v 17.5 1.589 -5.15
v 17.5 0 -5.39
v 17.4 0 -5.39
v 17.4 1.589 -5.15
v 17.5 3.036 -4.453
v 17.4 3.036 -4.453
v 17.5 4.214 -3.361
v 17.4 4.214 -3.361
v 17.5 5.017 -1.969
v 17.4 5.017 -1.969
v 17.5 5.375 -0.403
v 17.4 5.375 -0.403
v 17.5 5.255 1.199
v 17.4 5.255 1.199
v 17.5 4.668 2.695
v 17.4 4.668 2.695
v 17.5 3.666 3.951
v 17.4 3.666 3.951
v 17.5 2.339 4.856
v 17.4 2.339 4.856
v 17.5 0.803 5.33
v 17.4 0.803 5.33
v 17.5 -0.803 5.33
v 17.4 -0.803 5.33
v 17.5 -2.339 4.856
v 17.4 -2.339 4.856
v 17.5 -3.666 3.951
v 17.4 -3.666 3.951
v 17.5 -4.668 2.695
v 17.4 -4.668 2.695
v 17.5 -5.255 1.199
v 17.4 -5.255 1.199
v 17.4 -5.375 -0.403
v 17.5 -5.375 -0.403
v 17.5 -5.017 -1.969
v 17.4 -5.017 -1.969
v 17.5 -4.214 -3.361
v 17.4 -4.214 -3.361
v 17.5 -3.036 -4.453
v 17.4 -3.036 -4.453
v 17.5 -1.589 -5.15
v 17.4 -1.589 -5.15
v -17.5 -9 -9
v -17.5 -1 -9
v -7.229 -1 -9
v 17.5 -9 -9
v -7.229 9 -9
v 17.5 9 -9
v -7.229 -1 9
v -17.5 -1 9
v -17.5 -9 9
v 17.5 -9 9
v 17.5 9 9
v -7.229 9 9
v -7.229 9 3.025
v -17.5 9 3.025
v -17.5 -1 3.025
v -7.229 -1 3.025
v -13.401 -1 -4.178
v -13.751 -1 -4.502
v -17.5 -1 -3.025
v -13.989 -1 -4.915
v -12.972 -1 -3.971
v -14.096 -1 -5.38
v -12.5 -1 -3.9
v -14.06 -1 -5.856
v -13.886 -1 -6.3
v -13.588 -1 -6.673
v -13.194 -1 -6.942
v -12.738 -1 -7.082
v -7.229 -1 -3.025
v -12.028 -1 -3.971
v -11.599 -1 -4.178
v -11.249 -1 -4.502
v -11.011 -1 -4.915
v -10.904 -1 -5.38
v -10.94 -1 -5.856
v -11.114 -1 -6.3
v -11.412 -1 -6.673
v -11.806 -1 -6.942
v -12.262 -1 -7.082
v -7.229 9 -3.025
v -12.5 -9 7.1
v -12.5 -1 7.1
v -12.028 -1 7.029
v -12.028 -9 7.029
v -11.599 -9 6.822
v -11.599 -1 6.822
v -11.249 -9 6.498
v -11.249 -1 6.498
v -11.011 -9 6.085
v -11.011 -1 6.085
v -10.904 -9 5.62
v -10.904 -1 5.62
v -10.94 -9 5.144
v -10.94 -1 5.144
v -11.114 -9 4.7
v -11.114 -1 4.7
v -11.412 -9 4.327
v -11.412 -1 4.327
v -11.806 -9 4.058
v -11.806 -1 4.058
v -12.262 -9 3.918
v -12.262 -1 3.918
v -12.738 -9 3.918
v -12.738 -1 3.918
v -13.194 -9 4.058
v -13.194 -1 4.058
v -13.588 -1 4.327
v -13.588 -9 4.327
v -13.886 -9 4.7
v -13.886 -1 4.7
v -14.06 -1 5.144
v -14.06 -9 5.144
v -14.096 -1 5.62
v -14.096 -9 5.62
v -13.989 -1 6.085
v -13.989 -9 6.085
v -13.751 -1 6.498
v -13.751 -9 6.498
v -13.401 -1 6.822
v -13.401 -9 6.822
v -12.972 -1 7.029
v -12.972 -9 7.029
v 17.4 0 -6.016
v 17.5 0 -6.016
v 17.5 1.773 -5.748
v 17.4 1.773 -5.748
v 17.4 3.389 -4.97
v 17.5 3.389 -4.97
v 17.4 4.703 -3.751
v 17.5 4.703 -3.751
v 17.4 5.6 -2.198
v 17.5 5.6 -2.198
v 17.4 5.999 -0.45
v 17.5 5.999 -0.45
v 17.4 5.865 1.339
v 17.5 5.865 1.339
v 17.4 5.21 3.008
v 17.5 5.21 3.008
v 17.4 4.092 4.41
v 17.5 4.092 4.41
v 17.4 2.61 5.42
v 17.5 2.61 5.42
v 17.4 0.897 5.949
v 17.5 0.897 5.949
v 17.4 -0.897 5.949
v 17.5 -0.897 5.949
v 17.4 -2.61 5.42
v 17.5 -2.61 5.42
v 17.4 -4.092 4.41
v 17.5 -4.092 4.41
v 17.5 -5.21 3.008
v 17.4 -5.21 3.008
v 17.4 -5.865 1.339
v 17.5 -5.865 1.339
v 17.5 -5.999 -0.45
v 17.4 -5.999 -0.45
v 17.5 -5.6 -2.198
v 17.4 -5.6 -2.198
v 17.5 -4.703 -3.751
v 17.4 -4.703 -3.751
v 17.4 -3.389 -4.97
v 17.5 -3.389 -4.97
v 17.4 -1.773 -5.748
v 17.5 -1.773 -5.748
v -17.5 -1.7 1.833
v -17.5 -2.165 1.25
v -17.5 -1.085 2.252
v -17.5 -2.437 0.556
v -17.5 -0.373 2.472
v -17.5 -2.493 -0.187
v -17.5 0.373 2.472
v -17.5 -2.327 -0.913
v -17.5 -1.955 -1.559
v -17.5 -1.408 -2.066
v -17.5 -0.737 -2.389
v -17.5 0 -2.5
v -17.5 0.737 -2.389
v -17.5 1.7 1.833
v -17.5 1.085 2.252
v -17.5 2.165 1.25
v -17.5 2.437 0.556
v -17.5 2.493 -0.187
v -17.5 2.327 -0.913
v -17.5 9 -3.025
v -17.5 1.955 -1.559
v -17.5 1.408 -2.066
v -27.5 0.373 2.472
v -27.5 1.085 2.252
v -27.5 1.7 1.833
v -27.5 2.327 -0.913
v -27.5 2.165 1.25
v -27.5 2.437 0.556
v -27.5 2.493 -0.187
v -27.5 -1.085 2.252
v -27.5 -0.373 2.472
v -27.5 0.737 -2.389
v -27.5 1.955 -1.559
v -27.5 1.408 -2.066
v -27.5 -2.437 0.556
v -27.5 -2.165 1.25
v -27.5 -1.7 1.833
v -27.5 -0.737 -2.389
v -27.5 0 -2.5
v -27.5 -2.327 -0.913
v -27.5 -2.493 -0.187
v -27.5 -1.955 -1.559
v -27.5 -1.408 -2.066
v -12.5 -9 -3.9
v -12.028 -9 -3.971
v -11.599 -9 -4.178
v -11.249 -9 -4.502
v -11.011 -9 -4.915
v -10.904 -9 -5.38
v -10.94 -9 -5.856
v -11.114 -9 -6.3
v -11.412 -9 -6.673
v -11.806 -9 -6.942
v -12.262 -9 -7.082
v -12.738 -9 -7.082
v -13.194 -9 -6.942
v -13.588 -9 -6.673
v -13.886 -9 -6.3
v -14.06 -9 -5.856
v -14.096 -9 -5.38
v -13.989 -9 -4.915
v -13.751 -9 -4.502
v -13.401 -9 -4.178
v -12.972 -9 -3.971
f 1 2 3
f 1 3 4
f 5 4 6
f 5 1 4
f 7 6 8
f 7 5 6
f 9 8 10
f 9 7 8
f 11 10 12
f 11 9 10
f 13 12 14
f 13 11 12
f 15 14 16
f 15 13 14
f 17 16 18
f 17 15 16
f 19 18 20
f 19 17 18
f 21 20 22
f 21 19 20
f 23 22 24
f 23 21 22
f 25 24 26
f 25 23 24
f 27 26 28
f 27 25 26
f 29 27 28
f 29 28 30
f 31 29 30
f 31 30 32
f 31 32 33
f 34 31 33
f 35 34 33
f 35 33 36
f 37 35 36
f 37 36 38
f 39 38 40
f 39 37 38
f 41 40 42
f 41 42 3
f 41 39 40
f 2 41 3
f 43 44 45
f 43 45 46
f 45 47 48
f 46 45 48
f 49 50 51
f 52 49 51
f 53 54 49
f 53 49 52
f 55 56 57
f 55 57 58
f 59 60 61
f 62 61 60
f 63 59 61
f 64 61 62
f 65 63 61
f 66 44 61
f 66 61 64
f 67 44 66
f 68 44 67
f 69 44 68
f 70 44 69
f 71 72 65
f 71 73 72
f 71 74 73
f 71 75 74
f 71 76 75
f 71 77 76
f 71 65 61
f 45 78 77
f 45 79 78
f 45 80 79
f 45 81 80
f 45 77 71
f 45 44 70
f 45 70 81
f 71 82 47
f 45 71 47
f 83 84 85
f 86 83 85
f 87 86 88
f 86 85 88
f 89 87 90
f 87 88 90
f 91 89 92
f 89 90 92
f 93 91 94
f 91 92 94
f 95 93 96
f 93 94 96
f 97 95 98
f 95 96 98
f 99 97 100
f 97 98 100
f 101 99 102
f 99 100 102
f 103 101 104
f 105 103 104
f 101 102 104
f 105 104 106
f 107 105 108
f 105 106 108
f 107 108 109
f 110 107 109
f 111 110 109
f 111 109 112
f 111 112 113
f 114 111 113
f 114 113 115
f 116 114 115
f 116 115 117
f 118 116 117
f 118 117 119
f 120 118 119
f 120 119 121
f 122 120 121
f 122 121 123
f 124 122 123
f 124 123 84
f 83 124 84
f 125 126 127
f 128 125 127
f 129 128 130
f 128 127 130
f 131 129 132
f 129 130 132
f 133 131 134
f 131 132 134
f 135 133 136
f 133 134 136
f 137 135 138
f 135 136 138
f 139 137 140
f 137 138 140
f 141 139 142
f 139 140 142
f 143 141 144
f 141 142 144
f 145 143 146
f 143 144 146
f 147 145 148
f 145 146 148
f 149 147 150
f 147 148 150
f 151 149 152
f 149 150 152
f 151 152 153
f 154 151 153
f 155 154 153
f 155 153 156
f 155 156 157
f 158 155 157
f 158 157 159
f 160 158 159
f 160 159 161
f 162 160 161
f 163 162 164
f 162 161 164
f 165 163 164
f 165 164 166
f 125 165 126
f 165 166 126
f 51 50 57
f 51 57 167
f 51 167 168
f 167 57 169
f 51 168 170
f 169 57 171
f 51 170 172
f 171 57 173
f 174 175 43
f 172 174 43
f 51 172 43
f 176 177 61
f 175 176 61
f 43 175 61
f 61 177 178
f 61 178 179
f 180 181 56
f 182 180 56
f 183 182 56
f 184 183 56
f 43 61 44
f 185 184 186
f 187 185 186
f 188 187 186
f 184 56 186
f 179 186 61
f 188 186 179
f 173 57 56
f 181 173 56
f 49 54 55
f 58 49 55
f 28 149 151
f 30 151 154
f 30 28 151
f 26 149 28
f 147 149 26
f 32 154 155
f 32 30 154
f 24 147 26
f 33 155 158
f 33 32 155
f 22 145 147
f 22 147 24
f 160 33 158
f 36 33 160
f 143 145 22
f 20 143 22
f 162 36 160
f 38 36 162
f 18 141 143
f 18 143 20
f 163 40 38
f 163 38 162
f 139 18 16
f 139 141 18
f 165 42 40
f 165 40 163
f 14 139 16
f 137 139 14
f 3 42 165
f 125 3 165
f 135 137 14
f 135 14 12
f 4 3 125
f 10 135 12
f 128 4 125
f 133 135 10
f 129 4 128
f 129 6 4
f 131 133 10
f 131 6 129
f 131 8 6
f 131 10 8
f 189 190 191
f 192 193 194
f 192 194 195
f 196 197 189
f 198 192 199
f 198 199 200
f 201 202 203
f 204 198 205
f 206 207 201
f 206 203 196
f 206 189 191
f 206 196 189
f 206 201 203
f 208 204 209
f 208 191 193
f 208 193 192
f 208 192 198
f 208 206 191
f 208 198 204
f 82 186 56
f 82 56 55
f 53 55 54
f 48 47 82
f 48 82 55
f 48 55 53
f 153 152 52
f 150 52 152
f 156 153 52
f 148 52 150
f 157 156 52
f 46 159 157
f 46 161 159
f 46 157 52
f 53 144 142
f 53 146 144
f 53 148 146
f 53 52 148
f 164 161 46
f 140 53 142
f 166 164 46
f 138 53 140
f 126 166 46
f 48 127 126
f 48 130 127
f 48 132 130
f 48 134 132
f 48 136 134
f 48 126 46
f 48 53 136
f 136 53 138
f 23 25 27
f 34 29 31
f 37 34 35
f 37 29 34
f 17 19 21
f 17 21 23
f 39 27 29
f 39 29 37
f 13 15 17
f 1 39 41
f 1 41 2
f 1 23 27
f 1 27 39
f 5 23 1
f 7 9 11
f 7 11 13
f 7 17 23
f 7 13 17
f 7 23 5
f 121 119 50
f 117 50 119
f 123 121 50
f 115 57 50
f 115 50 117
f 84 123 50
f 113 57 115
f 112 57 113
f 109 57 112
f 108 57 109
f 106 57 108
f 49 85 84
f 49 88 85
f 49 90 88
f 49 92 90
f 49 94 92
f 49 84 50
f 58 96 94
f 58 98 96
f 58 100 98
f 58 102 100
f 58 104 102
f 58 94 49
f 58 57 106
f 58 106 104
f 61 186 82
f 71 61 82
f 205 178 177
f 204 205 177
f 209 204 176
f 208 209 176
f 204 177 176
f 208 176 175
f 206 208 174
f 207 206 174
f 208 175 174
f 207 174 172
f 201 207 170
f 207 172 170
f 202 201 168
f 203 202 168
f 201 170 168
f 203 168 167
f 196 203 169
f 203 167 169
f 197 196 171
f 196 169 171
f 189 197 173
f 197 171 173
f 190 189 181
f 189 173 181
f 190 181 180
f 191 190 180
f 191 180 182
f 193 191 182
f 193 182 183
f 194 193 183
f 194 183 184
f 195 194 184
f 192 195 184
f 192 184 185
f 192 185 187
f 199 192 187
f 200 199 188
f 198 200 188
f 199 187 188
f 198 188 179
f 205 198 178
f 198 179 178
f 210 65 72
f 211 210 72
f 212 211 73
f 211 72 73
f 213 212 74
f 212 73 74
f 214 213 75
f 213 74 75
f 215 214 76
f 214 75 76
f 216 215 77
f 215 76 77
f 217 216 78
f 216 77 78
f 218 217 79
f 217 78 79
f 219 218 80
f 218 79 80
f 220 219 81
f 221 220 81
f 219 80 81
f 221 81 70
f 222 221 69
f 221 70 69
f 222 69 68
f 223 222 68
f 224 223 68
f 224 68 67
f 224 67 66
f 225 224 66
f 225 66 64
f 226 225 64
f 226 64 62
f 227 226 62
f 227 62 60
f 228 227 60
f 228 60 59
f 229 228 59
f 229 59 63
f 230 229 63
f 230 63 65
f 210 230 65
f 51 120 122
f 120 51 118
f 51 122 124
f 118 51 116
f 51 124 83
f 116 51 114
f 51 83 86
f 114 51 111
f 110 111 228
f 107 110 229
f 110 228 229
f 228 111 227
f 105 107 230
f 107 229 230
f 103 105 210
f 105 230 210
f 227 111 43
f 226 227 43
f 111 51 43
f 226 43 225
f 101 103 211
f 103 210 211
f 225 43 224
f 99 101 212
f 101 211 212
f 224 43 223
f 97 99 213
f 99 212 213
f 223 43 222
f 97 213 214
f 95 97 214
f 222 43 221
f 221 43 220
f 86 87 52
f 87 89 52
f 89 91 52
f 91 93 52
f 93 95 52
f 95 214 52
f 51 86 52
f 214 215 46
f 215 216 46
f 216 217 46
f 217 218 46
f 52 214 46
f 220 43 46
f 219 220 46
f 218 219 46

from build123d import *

# Parameters (mm, degrees)
SKETCH_1_W          = 35
SKETCH_1_H          = 18
EXTRUDE_1_DEPTH     = 9
SKETCH_2_R          = 6.015690921
SKETCH_2_R_2        = 5.389890323
CUT_EXTRUDE_1_DEPTH = 0.1
SKETCH_3_R          = 1.6
CUT_EXTRUDE_2_DEPTH = 27.669270706
SKETCH_4_R          = 2.5
EXTRUDE_2_DEPTH     = 10
SKETCH_5_W          = 10.271095748
SKETCH_5_H          = 5.975058515
CUT_EXTRUDE_3_DEPTH = 10


with BuildPart() as part:
    # 草图1 → 凸台-拉伸1 (new, symmetric)
    with BuildSketch(Plane(origin=(0, 0, 0), x_dir=(1, 0, 0), z_dir=(0, 1, 0))):
        Rectangle(SKETCH_1_W, SKETCH_1_H)
    extrude(amount=EXTRUDE_1_DEPTH, both=True)

    # 草图2 → 切除-拉伸1 (cut)
    with BuildSketch(Plane(origin=(17.5, 0, 0), x_dir=(0, 0, -1), z_dir=(1, 0, 0))):
        Circle(SKETCH_2_R)
        Circle(SKETCH_2_R_2, mode=Mode.SUBTRACT)
    extrude(amount=-CUT_EXTRUDE_1_DEPTH, mode=Mode.SUBTRACT)

    # 草图3 → 切除-拉伸2 (cut, through all)
    with BuildSketch(Plane(origin=(0, 9, 0), x_dir=(1, 0, 0), z_dir=(0, 1, 0))):
        with Locations(Location((-12.5, 5.5, 0), (0, 0, 270))):
            Circle(SKETCH_3_R)
        with Locations(Location((-12.5, -5.5, 0), (0, 0, 270))):
            Circle(SKETCH_3_R)
    extrude(amount=-CUT_EXTRUDE_2_DEPTH, mode=Mode.SUBTRACT)

    # 草图4 → 凸台-拉伸2 (add)
    with BuildSketch(Plane.ZY.offset(17.5)):
        with Locations(Location((0, 0, 0), (0, 0, 180))):
            Circle(SKETCH_4_R)
    extrude(amount=EXTRUDE_2_DEPTH)

    # 草图5 → 切除-拉伸3 (cut)
    with BuildSketch(Plane(origin=(0, 9, 0), x_dir=(1, 0, 0), z_dir=(0, 1, 0))):
        with Locations((-12.364452126, 6.012470742)):
            Rectangle(SKETCH_5_W, SKETCH_5_H)
        with Locations((-12.364452126, -6.012470742)):
            Rectangle(SKETCH_5_W, SKETCH_5_H)
    extrude(amount=-CUT_EXTRUDE_3_DEPTH, mode=Mode.SUBTRACT)


solid = part.part
